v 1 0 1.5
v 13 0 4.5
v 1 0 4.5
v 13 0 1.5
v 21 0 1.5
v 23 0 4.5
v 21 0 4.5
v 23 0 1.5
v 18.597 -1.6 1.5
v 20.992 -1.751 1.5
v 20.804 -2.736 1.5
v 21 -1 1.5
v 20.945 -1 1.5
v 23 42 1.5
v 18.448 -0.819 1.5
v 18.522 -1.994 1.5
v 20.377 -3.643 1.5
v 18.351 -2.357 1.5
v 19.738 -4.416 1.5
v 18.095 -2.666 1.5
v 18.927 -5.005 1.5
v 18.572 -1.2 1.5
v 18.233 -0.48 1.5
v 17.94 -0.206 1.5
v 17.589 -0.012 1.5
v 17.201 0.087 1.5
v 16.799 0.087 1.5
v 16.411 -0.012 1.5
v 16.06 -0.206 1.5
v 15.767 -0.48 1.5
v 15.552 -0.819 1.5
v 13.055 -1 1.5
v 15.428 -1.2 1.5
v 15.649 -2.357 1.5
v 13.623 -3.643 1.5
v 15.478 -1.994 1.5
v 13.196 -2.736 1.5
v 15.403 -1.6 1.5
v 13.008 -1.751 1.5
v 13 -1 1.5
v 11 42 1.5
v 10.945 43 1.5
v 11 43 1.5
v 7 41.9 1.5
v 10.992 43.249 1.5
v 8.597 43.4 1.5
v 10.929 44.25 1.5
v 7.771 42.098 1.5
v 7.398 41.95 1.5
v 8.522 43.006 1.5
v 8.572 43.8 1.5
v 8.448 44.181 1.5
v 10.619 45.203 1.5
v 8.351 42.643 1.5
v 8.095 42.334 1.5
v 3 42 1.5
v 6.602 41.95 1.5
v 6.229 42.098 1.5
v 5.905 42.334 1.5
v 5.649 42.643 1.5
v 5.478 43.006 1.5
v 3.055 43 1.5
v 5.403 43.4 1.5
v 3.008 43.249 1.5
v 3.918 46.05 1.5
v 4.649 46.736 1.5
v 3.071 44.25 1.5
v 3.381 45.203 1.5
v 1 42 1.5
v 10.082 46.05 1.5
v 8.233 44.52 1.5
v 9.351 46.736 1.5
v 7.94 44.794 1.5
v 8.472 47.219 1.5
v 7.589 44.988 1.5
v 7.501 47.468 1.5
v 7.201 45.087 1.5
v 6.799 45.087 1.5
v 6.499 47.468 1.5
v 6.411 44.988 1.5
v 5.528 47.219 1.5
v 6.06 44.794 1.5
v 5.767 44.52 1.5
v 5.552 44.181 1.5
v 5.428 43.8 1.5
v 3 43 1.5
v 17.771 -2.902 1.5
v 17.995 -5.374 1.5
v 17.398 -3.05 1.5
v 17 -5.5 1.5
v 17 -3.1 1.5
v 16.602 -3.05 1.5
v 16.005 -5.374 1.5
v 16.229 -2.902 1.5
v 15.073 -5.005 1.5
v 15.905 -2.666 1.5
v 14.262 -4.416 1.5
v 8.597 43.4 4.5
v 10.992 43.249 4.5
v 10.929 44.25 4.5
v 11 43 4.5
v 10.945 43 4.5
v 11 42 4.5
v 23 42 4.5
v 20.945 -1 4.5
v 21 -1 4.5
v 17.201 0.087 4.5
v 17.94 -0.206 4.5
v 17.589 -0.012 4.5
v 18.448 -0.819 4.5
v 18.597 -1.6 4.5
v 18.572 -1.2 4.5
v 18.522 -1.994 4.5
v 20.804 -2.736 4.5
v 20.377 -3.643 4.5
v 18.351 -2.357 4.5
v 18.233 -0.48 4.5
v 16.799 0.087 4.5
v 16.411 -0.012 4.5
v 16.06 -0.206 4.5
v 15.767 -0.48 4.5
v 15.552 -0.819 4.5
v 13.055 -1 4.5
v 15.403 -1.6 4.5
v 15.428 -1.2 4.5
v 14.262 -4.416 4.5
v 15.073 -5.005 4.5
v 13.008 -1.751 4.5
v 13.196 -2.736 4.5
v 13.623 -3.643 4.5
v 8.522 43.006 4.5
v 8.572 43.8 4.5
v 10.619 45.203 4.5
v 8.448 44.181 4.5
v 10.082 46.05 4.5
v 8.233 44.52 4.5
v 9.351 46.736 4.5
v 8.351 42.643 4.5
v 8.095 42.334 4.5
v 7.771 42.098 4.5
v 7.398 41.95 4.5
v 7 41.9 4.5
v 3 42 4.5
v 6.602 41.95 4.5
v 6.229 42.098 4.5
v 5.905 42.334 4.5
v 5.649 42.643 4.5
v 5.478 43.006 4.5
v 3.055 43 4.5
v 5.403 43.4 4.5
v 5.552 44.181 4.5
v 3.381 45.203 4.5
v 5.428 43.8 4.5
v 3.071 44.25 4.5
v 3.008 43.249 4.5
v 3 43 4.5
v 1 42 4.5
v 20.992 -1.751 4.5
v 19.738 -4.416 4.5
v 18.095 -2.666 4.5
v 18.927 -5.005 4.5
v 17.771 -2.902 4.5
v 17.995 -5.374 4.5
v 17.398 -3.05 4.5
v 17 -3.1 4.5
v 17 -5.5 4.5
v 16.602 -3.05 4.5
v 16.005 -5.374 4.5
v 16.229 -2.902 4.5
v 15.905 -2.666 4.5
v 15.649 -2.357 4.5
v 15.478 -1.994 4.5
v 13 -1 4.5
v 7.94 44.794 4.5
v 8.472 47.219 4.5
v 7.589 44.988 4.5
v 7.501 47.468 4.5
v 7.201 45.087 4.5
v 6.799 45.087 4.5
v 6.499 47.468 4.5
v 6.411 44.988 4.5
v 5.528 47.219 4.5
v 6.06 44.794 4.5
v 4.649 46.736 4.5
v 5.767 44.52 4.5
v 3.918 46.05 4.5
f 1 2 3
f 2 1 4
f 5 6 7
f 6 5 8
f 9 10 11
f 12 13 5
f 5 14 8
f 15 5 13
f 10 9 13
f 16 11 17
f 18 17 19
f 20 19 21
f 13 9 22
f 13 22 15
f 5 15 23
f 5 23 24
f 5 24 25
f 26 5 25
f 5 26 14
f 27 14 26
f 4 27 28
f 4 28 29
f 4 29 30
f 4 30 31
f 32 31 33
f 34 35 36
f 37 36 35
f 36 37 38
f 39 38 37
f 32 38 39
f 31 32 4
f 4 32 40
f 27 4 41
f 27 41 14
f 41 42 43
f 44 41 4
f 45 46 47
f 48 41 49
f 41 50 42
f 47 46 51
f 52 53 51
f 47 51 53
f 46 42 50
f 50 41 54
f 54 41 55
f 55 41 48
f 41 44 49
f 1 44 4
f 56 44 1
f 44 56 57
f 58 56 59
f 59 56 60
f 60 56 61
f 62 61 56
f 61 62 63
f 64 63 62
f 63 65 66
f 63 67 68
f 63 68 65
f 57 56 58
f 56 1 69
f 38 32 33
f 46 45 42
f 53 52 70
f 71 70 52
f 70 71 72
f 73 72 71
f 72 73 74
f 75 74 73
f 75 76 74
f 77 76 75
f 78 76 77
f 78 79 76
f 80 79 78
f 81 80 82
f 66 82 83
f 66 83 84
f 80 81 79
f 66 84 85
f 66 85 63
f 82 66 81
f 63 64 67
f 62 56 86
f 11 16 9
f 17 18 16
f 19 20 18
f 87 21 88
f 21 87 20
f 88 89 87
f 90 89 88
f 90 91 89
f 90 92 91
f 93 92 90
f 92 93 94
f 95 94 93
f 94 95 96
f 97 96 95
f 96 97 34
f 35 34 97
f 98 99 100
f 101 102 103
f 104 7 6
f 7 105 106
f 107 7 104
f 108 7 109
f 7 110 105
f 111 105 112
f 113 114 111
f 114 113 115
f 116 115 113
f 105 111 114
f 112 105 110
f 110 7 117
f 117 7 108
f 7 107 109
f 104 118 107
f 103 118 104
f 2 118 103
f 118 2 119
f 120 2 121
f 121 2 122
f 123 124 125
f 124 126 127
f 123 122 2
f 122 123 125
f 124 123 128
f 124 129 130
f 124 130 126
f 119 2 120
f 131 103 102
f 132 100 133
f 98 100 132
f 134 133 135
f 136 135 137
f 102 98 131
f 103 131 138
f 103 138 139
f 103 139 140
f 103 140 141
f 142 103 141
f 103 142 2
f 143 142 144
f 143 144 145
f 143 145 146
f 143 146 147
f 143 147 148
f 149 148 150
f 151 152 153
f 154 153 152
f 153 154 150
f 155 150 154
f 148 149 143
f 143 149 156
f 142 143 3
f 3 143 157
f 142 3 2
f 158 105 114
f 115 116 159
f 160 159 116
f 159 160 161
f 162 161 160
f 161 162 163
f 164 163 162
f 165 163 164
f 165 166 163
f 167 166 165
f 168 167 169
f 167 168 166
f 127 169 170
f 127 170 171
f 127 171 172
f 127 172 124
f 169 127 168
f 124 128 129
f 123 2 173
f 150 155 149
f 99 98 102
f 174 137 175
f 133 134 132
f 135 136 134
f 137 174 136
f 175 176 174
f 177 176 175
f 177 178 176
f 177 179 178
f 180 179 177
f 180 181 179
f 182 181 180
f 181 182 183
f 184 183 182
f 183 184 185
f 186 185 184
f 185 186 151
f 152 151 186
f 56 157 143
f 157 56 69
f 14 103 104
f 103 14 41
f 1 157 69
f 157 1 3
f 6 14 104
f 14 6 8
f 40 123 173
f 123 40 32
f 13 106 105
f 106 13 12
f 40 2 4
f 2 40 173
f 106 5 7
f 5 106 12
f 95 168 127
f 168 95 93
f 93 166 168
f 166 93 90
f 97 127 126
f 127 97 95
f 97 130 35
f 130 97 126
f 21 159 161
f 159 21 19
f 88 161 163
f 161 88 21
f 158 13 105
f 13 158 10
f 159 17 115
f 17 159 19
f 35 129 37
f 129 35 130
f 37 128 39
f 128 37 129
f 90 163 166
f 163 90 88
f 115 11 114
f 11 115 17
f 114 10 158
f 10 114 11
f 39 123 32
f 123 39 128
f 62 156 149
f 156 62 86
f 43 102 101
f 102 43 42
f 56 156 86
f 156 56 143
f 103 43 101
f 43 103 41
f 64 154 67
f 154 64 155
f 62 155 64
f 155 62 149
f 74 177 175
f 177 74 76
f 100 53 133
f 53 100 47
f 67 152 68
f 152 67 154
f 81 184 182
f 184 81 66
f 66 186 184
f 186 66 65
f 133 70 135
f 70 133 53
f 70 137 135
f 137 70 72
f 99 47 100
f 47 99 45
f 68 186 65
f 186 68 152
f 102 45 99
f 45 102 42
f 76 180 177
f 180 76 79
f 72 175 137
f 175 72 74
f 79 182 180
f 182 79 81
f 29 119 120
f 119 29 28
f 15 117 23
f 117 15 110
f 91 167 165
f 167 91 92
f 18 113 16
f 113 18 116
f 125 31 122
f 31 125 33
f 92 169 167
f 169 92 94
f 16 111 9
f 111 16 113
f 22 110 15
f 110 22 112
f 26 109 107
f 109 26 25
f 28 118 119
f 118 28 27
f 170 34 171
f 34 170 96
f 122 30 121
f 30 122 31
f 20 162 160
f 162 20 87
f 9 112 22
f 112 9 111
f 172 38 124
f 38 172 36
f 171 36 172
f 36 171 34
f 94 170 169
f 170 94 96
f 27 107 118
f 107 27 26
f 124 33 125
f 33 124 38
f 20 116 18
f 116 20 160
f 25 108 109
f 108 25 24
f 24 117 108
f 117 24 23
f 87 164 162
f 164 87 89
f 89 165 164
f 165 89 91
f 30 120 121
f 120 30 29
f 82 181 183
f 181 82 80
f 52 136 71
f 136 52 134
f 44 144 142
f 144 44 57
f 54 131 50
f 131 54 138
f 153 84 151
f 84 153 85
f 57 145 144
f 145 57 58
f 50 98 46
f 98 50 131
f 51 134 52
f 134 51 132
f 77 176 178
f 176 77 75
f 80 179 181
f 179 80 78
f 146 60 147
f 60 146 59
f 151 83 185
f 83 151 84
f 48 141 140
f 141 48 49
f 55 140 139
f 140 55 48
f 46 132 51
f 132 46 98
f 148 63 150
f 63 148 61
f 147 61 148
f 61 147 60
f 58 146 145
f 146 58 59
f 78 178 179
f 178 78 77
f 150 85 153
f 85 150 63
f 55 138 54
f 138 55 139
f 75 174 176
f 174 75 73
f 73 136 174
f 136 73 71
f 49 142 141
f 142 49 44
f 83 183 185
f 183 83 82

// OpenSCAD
// RC2014 Port Cover v1.0
//
// This script is based almost entirely on WALLY by TheNewHobbyist 2013. See notes below.
// It has been modified by Spencer from z80kits.com to suit the port cover panels on
// the RC2014 Blue Box Enclosure. These port covers are only onse size and  will only 
// fit one connector, so everything about multiple panels, multiple connectors and even
// large items like switches or power sockets has been stripped out.
//
// some of the code may well be redundant for only a single connector mounted in a panel
// of a fixed size. Sorry. I am sure things can be tidied up a lot.

// WALLY - Wall Plate Customizer v1.3
// by TheNewHobbyist 2013 (http://thenewhobbyist.com)
// http://www.thingiverse.com/thing:47956
//
// Most of the connectors used with this thing are panel mount connectors from
// www.DataPro.net I can't vouch for their quality but they did have easy to
// find dimensions for their products so I used them.
//
// This could be tightened up considerably but I thought I'd get it out there for people
// to experiment with before I lose my mind staring at it too long. Also this is my
// first OpenSCAD model so cut me some slack ;)
//
//  V1.0 Initial model as uploaded to Thingiverse
//  v1.1 Round holes much rounder and artifacts around the ears has been fixed
//

  //////////////////////////
 // Customizer Settings: //
//////////////////////////



//Type of port cover
1st_plate = "none";  //	["none":None, "blank":Blank Port, "keystone1":Keystone Jack, "vga":VGA Port, "hdmi":HDMI Port, "dvi":DVI-I Port, "displayport":Displayport, "cat5e":Cat5e/Cat6 Port, "usb-a":USB-A Port, "usb-b":USB-B Port, "firewire":Firewire IEEE 1394 Port, "db09":DB-09 Port, "ps2":PS2 Port, "f-type": F-Type/Coaxial Port,"svideo":S-Video Port, "stereo":Stereo Headphone Jack]

module GoAwayCustomizer() {
// This module is here to stop Customizer from picking up the variables below
}

//How big are we talkin' here?
plate_width = 1; //	[1:5]

// Bigger hole in your wall? Try this
plate_size = 0; // [0:Standard, 1:Junior-Jumbo, 2:Jumbo]
$fn=25;

  //////////////////////
 // Static Settings: //
//////////////////////

l_offset = [12];
r_offset = [12];
spacer = [0,0];
solid_plate_width = 24;

height_sizes = [42];

thickness = 3; //Port cover thickness (static)
height = 42; //Port cover height (static)
width = 22; //Port cover width (static)

positions=[height/2,height/2 - 14.25,height/2 + 14.25];

  ///////////////////
 // Hole Control: //
///////////////////

module plate1(){
	
		//translate([0,l_offset[plate_size],0]) box_screws();
		translate([positions[0],l_offset[plate_size],0]) hole(1st_plate);
			}


  /////////////////
 // SolidWorks: //
/////////////////

module plate1_solid(){
if (1st_plate == "keystone1" ) {
	translate([height/2 + 14.3,l_offset[plate_size] - 11.5,-3.9]) hole("keystone_solid");
	}
}

module portcoverblank() {
    difference () {
    union() {
        cube([height,width,thickness], center=true);
        translate([21.5,-5,0]) rotate([0,0,0]) cube ([1.001,8,thickness], center=true);
        translate([22.5,-5,0]) rotate([0,0,0]) cylinder (thickness,4,4, center=true);
        translate([-21.5,5,0]) rotate([0,0,0]) cube ([1.001,8,thickness], center=true);
        translate([-22.5,5,0]) rotate([0,0,0]) cylinder (thickness,4,4, center=true);
            }      
            translate([22.5,-5,0]) rotate([0,0,0]) cylinder (3.5,1.6,1.6, center=true);
            translate([-22.5,5,0]) rotate([0,0,0]) cylinder (3.5,1.6,1.6, center=true);
            }
}

// Hole Cutout definitions
module hole(hole_type) {

// Blank plate
	if (hole_type == "blank") { }

// VGA & DB09 plate
// VGA Fits http://www.datapro.net/products/vga-dual-panel-mount-f-f-cable.html
// DB09 Fits http://www.datapro.net/products/db9-serial-panel-mount-male-extension.html
	if (hole_type == "vga" || hole_type == "db09") {
        rotate([0,0,90]){
			translate([0,-12.5,3]) cylinder(r=1.75, h=10, center = true);
			translate([0,12.5,3]) cylinder(r=1.75, h=10, center = true);
				difference(){
					cube([10,19,13], center=true);
					translate([-5,-9.2,1]) rotate([0,0,-35.6]) cube([4.4,2.4,15], center=true);
					translate([.9,-11.2,0]) rotate([0,0,9.6]) cube([10,4.8,15], center=true);
					translate([4.6,-8.5,0]) rotate([0,0,37.2]) cube([4.4,2.4,15], center=true);
					translate([-5,9.2,1]) rotate([0,0,35.6]) cube([4.4,2.4,15], center=true);
					translate([0.9,11.2,0]) rotate([0,0,-9.6]) cube([10,4.8,15], center=true);
					translate([4.6,8.5,0]) rotate([0,0,-37.2]) cube([4.4,2.4,15], center=true);
								}
						}
                    }

// HDMI plate
// Fits http://www.datapro.net/products/hdmi-panel-mount-extension-cable.html
	if (hole_type == "hdmi") {
        rotate([0,0,90]){
		translate([0,-13,3]) cylinder(r=1.75, h=10, center = true);
		translate([0,13,3]) cylinder(r=1.75, h=10, center = true);
		translate([0,0,3]) cube([6,16,10], center=true);
							}
                        }

// DVI-I plate
// Fits http://www.datapro.net/products/dvi-i-panel-mount-extension-cable.html
	if (hole_type == "dvi") {
        rotate([0,0,90]){
		translate([0,-16,3]) cylinder(r=1.75, h=10, center = true);
		translate([0,16,3]) cylinder(r=1.75, h=10, center = true);
		translate([0,0,3]) cube([10,26,10], center=true);
							}
                        }

// DisplayPort plate
// Fits http://www.datapro.net/products/dvi-i-panel-mount-extension-cable.html
	if (hole_type == "displayport") {
        rotate([0,0,90]){
		translate([0,-13.5,3]) cylinder(r=1.75, h=10, center = true);
		translate([0,13.5,3]) cylinder(r=1.75, h=10, center = true);
		translate([0,0,0]){
			difference(){
				translate([0,0,3]) cube([7,19,10], center=true);
				translate([2.47,-9.37,3]) rotate([0,0,-54.6]) cube([3,5,14], center=true);
						}
								}
									}
                                }

// USB-A Plate
// Fits http://www.datapro.net/products/usb-panel-mount-type-a-cable.html
	if (hole_type == "usb-a") {
        rotate([0,0,90]){
		translate([0,-15,3]) cylinder(r=1.75, h=10, center = true);
		translate([0,15,3]) cylinder(r=1.75, h=10, center = true);
		translate([0,0,3]) cube([8,16,10], center=true);
							}
                        }

// USB-B Plate
// Fits http://www.datapro.net/products/usb-panel-mount-type-b-cable.html
	if (hole_type == "usb-b") {
        rotate([0,0,90]){
		translate([0,-13,3]) cylinder(r=1.75, h=10, center = true);
		translate([0,13,3]) cylinder(r=1.75, h=10, center = true);
		translate([0,0,3]) cube([11,12,10], center=true);
							}
                        }

// 1394 Firewire Plate
// Fits http://www.datapro.net/products/firewire-panel-mount-extension.html
	if (hole_type == "firewire") {
        rotate([0,0,90]){
		translate([0,-13.5,3]) cylinder(r=1.75, h=10, center = true);
		translate([0,13.5,3]) cylinder(r=1.75, h=10, center = true);
		translate([0,0,3]) cube([7,12,10], center=true);
							}
                        }

// F-Type / Cable TV Plate
// Fits http://www.datapro.net/products/f-type-panel-mounting-coupler.html
	if (hole_type == "f-type") {
		translate([0,0,3]) cylinder(r=4.7625, h=10, center=true);
							}

// Cat5e & Gat6 plate
// Cat5e Fits http://www.datapro.net/products/cat-5e-panel-mount-ethernet.html
// Cat6 Fits hhttp://www.datapro.net/products/cat-6-panel-mount-ethernet.html
	if (hole_type == "cat5e" || hole_type == "cat6") {
        rotate([0,0,90]){
		translate([0,-12.5,3]) cylinder(r=1.75, h=10, center = true);
		translate([0,12.5,3]) cylinder(r=1.75, h=10, center = true);
		translate([0,0,3]) cube([15,15,10], center=true);
		}
    }

// S-Video & PS2 plate
// S-Video Fits hhttp://www.datapro.net/products/cat-6-panel-mount-ethernet.html
// PS2 http://www.datapro.net/products/ps2-panel-mount-extension-cable.html
	if (hole_type == "svideo" || hole_type == "ps2") {
        rotate([0,0,90]){
		translate([0,-10,3]) cylinder(r=1.75, h=10, center = true);
		translate([0,10,3]) cylinder(r=1.75, h=10, center = true);
		translate([0,0,3]) cylinder(r=5, h=10, center=true);
		}
    }


// Stereo / 1/4" headphone jack coupler
// Stereo coupler Fits http://www.datapro.net/products/stereo-panel-mount-coupler.html
	if (hole_type == "stereo") {
		translate([0,0,3]) cylinder(r=2.985, h=10, center=true);
		}

//Keystone1 hole
//Hole for 1 Keystone Jack
	if (hole_type == "keystone1") {
		translate([0,0,5]) cube([16.6,15,10], center = true);
	}

//Keystone Solid
	if (hole_type == "keystone_solid") {
        
		rotate([0,0,90]) {
			difference(){
				translate([.5,0,.1]) cube([22,30.5,9.8]);
                    difference(){
                        translate([4,22.501,3.501]) rotate([45,0,0]) cube([15,3,3]); //this part makes it slightly easier to swivel in a keystone connector
                    }
					translate([4,4,0]){
						difference(){
							cube([15,22.5,10]);
							translate([-1,-0.001,3.501]) cube([17,2,6.5]);
							translate([-1,2.5,-3.40970]) rotate([45,0,0]) cube([17,2,6.5]);
							translate([-1,18.801,6.001]) cube([17,4,4]);
							translate([-1,20.5,0]) rotate([-45,0,0]) cube([17,2,6.5]);
						}
					}
				}
			}
		}
//End of module "hole"
}

  ////////////////////////
 // Number One ENGAGE: //
////////////////////////

// Rotate so it sits correctly on plate (whoops) and make upside down
rotate([0,180,90]){
// put plate at 0,0,0 for easier printing
translate([-height/2,-solid_plate_width/2,-thickness]){

	difference() {
		translate ([0,0,0]) portcoverblank();
		
		translate ([-height/2,-solid_plate_width/2,-thickness]) plate1();
			}
		union() {
		translate ([-height/2,-solid_plate_width/2,-thickness-1.5]) plate1_solid();
		}
//End Rotate
}
//End Translate
}
